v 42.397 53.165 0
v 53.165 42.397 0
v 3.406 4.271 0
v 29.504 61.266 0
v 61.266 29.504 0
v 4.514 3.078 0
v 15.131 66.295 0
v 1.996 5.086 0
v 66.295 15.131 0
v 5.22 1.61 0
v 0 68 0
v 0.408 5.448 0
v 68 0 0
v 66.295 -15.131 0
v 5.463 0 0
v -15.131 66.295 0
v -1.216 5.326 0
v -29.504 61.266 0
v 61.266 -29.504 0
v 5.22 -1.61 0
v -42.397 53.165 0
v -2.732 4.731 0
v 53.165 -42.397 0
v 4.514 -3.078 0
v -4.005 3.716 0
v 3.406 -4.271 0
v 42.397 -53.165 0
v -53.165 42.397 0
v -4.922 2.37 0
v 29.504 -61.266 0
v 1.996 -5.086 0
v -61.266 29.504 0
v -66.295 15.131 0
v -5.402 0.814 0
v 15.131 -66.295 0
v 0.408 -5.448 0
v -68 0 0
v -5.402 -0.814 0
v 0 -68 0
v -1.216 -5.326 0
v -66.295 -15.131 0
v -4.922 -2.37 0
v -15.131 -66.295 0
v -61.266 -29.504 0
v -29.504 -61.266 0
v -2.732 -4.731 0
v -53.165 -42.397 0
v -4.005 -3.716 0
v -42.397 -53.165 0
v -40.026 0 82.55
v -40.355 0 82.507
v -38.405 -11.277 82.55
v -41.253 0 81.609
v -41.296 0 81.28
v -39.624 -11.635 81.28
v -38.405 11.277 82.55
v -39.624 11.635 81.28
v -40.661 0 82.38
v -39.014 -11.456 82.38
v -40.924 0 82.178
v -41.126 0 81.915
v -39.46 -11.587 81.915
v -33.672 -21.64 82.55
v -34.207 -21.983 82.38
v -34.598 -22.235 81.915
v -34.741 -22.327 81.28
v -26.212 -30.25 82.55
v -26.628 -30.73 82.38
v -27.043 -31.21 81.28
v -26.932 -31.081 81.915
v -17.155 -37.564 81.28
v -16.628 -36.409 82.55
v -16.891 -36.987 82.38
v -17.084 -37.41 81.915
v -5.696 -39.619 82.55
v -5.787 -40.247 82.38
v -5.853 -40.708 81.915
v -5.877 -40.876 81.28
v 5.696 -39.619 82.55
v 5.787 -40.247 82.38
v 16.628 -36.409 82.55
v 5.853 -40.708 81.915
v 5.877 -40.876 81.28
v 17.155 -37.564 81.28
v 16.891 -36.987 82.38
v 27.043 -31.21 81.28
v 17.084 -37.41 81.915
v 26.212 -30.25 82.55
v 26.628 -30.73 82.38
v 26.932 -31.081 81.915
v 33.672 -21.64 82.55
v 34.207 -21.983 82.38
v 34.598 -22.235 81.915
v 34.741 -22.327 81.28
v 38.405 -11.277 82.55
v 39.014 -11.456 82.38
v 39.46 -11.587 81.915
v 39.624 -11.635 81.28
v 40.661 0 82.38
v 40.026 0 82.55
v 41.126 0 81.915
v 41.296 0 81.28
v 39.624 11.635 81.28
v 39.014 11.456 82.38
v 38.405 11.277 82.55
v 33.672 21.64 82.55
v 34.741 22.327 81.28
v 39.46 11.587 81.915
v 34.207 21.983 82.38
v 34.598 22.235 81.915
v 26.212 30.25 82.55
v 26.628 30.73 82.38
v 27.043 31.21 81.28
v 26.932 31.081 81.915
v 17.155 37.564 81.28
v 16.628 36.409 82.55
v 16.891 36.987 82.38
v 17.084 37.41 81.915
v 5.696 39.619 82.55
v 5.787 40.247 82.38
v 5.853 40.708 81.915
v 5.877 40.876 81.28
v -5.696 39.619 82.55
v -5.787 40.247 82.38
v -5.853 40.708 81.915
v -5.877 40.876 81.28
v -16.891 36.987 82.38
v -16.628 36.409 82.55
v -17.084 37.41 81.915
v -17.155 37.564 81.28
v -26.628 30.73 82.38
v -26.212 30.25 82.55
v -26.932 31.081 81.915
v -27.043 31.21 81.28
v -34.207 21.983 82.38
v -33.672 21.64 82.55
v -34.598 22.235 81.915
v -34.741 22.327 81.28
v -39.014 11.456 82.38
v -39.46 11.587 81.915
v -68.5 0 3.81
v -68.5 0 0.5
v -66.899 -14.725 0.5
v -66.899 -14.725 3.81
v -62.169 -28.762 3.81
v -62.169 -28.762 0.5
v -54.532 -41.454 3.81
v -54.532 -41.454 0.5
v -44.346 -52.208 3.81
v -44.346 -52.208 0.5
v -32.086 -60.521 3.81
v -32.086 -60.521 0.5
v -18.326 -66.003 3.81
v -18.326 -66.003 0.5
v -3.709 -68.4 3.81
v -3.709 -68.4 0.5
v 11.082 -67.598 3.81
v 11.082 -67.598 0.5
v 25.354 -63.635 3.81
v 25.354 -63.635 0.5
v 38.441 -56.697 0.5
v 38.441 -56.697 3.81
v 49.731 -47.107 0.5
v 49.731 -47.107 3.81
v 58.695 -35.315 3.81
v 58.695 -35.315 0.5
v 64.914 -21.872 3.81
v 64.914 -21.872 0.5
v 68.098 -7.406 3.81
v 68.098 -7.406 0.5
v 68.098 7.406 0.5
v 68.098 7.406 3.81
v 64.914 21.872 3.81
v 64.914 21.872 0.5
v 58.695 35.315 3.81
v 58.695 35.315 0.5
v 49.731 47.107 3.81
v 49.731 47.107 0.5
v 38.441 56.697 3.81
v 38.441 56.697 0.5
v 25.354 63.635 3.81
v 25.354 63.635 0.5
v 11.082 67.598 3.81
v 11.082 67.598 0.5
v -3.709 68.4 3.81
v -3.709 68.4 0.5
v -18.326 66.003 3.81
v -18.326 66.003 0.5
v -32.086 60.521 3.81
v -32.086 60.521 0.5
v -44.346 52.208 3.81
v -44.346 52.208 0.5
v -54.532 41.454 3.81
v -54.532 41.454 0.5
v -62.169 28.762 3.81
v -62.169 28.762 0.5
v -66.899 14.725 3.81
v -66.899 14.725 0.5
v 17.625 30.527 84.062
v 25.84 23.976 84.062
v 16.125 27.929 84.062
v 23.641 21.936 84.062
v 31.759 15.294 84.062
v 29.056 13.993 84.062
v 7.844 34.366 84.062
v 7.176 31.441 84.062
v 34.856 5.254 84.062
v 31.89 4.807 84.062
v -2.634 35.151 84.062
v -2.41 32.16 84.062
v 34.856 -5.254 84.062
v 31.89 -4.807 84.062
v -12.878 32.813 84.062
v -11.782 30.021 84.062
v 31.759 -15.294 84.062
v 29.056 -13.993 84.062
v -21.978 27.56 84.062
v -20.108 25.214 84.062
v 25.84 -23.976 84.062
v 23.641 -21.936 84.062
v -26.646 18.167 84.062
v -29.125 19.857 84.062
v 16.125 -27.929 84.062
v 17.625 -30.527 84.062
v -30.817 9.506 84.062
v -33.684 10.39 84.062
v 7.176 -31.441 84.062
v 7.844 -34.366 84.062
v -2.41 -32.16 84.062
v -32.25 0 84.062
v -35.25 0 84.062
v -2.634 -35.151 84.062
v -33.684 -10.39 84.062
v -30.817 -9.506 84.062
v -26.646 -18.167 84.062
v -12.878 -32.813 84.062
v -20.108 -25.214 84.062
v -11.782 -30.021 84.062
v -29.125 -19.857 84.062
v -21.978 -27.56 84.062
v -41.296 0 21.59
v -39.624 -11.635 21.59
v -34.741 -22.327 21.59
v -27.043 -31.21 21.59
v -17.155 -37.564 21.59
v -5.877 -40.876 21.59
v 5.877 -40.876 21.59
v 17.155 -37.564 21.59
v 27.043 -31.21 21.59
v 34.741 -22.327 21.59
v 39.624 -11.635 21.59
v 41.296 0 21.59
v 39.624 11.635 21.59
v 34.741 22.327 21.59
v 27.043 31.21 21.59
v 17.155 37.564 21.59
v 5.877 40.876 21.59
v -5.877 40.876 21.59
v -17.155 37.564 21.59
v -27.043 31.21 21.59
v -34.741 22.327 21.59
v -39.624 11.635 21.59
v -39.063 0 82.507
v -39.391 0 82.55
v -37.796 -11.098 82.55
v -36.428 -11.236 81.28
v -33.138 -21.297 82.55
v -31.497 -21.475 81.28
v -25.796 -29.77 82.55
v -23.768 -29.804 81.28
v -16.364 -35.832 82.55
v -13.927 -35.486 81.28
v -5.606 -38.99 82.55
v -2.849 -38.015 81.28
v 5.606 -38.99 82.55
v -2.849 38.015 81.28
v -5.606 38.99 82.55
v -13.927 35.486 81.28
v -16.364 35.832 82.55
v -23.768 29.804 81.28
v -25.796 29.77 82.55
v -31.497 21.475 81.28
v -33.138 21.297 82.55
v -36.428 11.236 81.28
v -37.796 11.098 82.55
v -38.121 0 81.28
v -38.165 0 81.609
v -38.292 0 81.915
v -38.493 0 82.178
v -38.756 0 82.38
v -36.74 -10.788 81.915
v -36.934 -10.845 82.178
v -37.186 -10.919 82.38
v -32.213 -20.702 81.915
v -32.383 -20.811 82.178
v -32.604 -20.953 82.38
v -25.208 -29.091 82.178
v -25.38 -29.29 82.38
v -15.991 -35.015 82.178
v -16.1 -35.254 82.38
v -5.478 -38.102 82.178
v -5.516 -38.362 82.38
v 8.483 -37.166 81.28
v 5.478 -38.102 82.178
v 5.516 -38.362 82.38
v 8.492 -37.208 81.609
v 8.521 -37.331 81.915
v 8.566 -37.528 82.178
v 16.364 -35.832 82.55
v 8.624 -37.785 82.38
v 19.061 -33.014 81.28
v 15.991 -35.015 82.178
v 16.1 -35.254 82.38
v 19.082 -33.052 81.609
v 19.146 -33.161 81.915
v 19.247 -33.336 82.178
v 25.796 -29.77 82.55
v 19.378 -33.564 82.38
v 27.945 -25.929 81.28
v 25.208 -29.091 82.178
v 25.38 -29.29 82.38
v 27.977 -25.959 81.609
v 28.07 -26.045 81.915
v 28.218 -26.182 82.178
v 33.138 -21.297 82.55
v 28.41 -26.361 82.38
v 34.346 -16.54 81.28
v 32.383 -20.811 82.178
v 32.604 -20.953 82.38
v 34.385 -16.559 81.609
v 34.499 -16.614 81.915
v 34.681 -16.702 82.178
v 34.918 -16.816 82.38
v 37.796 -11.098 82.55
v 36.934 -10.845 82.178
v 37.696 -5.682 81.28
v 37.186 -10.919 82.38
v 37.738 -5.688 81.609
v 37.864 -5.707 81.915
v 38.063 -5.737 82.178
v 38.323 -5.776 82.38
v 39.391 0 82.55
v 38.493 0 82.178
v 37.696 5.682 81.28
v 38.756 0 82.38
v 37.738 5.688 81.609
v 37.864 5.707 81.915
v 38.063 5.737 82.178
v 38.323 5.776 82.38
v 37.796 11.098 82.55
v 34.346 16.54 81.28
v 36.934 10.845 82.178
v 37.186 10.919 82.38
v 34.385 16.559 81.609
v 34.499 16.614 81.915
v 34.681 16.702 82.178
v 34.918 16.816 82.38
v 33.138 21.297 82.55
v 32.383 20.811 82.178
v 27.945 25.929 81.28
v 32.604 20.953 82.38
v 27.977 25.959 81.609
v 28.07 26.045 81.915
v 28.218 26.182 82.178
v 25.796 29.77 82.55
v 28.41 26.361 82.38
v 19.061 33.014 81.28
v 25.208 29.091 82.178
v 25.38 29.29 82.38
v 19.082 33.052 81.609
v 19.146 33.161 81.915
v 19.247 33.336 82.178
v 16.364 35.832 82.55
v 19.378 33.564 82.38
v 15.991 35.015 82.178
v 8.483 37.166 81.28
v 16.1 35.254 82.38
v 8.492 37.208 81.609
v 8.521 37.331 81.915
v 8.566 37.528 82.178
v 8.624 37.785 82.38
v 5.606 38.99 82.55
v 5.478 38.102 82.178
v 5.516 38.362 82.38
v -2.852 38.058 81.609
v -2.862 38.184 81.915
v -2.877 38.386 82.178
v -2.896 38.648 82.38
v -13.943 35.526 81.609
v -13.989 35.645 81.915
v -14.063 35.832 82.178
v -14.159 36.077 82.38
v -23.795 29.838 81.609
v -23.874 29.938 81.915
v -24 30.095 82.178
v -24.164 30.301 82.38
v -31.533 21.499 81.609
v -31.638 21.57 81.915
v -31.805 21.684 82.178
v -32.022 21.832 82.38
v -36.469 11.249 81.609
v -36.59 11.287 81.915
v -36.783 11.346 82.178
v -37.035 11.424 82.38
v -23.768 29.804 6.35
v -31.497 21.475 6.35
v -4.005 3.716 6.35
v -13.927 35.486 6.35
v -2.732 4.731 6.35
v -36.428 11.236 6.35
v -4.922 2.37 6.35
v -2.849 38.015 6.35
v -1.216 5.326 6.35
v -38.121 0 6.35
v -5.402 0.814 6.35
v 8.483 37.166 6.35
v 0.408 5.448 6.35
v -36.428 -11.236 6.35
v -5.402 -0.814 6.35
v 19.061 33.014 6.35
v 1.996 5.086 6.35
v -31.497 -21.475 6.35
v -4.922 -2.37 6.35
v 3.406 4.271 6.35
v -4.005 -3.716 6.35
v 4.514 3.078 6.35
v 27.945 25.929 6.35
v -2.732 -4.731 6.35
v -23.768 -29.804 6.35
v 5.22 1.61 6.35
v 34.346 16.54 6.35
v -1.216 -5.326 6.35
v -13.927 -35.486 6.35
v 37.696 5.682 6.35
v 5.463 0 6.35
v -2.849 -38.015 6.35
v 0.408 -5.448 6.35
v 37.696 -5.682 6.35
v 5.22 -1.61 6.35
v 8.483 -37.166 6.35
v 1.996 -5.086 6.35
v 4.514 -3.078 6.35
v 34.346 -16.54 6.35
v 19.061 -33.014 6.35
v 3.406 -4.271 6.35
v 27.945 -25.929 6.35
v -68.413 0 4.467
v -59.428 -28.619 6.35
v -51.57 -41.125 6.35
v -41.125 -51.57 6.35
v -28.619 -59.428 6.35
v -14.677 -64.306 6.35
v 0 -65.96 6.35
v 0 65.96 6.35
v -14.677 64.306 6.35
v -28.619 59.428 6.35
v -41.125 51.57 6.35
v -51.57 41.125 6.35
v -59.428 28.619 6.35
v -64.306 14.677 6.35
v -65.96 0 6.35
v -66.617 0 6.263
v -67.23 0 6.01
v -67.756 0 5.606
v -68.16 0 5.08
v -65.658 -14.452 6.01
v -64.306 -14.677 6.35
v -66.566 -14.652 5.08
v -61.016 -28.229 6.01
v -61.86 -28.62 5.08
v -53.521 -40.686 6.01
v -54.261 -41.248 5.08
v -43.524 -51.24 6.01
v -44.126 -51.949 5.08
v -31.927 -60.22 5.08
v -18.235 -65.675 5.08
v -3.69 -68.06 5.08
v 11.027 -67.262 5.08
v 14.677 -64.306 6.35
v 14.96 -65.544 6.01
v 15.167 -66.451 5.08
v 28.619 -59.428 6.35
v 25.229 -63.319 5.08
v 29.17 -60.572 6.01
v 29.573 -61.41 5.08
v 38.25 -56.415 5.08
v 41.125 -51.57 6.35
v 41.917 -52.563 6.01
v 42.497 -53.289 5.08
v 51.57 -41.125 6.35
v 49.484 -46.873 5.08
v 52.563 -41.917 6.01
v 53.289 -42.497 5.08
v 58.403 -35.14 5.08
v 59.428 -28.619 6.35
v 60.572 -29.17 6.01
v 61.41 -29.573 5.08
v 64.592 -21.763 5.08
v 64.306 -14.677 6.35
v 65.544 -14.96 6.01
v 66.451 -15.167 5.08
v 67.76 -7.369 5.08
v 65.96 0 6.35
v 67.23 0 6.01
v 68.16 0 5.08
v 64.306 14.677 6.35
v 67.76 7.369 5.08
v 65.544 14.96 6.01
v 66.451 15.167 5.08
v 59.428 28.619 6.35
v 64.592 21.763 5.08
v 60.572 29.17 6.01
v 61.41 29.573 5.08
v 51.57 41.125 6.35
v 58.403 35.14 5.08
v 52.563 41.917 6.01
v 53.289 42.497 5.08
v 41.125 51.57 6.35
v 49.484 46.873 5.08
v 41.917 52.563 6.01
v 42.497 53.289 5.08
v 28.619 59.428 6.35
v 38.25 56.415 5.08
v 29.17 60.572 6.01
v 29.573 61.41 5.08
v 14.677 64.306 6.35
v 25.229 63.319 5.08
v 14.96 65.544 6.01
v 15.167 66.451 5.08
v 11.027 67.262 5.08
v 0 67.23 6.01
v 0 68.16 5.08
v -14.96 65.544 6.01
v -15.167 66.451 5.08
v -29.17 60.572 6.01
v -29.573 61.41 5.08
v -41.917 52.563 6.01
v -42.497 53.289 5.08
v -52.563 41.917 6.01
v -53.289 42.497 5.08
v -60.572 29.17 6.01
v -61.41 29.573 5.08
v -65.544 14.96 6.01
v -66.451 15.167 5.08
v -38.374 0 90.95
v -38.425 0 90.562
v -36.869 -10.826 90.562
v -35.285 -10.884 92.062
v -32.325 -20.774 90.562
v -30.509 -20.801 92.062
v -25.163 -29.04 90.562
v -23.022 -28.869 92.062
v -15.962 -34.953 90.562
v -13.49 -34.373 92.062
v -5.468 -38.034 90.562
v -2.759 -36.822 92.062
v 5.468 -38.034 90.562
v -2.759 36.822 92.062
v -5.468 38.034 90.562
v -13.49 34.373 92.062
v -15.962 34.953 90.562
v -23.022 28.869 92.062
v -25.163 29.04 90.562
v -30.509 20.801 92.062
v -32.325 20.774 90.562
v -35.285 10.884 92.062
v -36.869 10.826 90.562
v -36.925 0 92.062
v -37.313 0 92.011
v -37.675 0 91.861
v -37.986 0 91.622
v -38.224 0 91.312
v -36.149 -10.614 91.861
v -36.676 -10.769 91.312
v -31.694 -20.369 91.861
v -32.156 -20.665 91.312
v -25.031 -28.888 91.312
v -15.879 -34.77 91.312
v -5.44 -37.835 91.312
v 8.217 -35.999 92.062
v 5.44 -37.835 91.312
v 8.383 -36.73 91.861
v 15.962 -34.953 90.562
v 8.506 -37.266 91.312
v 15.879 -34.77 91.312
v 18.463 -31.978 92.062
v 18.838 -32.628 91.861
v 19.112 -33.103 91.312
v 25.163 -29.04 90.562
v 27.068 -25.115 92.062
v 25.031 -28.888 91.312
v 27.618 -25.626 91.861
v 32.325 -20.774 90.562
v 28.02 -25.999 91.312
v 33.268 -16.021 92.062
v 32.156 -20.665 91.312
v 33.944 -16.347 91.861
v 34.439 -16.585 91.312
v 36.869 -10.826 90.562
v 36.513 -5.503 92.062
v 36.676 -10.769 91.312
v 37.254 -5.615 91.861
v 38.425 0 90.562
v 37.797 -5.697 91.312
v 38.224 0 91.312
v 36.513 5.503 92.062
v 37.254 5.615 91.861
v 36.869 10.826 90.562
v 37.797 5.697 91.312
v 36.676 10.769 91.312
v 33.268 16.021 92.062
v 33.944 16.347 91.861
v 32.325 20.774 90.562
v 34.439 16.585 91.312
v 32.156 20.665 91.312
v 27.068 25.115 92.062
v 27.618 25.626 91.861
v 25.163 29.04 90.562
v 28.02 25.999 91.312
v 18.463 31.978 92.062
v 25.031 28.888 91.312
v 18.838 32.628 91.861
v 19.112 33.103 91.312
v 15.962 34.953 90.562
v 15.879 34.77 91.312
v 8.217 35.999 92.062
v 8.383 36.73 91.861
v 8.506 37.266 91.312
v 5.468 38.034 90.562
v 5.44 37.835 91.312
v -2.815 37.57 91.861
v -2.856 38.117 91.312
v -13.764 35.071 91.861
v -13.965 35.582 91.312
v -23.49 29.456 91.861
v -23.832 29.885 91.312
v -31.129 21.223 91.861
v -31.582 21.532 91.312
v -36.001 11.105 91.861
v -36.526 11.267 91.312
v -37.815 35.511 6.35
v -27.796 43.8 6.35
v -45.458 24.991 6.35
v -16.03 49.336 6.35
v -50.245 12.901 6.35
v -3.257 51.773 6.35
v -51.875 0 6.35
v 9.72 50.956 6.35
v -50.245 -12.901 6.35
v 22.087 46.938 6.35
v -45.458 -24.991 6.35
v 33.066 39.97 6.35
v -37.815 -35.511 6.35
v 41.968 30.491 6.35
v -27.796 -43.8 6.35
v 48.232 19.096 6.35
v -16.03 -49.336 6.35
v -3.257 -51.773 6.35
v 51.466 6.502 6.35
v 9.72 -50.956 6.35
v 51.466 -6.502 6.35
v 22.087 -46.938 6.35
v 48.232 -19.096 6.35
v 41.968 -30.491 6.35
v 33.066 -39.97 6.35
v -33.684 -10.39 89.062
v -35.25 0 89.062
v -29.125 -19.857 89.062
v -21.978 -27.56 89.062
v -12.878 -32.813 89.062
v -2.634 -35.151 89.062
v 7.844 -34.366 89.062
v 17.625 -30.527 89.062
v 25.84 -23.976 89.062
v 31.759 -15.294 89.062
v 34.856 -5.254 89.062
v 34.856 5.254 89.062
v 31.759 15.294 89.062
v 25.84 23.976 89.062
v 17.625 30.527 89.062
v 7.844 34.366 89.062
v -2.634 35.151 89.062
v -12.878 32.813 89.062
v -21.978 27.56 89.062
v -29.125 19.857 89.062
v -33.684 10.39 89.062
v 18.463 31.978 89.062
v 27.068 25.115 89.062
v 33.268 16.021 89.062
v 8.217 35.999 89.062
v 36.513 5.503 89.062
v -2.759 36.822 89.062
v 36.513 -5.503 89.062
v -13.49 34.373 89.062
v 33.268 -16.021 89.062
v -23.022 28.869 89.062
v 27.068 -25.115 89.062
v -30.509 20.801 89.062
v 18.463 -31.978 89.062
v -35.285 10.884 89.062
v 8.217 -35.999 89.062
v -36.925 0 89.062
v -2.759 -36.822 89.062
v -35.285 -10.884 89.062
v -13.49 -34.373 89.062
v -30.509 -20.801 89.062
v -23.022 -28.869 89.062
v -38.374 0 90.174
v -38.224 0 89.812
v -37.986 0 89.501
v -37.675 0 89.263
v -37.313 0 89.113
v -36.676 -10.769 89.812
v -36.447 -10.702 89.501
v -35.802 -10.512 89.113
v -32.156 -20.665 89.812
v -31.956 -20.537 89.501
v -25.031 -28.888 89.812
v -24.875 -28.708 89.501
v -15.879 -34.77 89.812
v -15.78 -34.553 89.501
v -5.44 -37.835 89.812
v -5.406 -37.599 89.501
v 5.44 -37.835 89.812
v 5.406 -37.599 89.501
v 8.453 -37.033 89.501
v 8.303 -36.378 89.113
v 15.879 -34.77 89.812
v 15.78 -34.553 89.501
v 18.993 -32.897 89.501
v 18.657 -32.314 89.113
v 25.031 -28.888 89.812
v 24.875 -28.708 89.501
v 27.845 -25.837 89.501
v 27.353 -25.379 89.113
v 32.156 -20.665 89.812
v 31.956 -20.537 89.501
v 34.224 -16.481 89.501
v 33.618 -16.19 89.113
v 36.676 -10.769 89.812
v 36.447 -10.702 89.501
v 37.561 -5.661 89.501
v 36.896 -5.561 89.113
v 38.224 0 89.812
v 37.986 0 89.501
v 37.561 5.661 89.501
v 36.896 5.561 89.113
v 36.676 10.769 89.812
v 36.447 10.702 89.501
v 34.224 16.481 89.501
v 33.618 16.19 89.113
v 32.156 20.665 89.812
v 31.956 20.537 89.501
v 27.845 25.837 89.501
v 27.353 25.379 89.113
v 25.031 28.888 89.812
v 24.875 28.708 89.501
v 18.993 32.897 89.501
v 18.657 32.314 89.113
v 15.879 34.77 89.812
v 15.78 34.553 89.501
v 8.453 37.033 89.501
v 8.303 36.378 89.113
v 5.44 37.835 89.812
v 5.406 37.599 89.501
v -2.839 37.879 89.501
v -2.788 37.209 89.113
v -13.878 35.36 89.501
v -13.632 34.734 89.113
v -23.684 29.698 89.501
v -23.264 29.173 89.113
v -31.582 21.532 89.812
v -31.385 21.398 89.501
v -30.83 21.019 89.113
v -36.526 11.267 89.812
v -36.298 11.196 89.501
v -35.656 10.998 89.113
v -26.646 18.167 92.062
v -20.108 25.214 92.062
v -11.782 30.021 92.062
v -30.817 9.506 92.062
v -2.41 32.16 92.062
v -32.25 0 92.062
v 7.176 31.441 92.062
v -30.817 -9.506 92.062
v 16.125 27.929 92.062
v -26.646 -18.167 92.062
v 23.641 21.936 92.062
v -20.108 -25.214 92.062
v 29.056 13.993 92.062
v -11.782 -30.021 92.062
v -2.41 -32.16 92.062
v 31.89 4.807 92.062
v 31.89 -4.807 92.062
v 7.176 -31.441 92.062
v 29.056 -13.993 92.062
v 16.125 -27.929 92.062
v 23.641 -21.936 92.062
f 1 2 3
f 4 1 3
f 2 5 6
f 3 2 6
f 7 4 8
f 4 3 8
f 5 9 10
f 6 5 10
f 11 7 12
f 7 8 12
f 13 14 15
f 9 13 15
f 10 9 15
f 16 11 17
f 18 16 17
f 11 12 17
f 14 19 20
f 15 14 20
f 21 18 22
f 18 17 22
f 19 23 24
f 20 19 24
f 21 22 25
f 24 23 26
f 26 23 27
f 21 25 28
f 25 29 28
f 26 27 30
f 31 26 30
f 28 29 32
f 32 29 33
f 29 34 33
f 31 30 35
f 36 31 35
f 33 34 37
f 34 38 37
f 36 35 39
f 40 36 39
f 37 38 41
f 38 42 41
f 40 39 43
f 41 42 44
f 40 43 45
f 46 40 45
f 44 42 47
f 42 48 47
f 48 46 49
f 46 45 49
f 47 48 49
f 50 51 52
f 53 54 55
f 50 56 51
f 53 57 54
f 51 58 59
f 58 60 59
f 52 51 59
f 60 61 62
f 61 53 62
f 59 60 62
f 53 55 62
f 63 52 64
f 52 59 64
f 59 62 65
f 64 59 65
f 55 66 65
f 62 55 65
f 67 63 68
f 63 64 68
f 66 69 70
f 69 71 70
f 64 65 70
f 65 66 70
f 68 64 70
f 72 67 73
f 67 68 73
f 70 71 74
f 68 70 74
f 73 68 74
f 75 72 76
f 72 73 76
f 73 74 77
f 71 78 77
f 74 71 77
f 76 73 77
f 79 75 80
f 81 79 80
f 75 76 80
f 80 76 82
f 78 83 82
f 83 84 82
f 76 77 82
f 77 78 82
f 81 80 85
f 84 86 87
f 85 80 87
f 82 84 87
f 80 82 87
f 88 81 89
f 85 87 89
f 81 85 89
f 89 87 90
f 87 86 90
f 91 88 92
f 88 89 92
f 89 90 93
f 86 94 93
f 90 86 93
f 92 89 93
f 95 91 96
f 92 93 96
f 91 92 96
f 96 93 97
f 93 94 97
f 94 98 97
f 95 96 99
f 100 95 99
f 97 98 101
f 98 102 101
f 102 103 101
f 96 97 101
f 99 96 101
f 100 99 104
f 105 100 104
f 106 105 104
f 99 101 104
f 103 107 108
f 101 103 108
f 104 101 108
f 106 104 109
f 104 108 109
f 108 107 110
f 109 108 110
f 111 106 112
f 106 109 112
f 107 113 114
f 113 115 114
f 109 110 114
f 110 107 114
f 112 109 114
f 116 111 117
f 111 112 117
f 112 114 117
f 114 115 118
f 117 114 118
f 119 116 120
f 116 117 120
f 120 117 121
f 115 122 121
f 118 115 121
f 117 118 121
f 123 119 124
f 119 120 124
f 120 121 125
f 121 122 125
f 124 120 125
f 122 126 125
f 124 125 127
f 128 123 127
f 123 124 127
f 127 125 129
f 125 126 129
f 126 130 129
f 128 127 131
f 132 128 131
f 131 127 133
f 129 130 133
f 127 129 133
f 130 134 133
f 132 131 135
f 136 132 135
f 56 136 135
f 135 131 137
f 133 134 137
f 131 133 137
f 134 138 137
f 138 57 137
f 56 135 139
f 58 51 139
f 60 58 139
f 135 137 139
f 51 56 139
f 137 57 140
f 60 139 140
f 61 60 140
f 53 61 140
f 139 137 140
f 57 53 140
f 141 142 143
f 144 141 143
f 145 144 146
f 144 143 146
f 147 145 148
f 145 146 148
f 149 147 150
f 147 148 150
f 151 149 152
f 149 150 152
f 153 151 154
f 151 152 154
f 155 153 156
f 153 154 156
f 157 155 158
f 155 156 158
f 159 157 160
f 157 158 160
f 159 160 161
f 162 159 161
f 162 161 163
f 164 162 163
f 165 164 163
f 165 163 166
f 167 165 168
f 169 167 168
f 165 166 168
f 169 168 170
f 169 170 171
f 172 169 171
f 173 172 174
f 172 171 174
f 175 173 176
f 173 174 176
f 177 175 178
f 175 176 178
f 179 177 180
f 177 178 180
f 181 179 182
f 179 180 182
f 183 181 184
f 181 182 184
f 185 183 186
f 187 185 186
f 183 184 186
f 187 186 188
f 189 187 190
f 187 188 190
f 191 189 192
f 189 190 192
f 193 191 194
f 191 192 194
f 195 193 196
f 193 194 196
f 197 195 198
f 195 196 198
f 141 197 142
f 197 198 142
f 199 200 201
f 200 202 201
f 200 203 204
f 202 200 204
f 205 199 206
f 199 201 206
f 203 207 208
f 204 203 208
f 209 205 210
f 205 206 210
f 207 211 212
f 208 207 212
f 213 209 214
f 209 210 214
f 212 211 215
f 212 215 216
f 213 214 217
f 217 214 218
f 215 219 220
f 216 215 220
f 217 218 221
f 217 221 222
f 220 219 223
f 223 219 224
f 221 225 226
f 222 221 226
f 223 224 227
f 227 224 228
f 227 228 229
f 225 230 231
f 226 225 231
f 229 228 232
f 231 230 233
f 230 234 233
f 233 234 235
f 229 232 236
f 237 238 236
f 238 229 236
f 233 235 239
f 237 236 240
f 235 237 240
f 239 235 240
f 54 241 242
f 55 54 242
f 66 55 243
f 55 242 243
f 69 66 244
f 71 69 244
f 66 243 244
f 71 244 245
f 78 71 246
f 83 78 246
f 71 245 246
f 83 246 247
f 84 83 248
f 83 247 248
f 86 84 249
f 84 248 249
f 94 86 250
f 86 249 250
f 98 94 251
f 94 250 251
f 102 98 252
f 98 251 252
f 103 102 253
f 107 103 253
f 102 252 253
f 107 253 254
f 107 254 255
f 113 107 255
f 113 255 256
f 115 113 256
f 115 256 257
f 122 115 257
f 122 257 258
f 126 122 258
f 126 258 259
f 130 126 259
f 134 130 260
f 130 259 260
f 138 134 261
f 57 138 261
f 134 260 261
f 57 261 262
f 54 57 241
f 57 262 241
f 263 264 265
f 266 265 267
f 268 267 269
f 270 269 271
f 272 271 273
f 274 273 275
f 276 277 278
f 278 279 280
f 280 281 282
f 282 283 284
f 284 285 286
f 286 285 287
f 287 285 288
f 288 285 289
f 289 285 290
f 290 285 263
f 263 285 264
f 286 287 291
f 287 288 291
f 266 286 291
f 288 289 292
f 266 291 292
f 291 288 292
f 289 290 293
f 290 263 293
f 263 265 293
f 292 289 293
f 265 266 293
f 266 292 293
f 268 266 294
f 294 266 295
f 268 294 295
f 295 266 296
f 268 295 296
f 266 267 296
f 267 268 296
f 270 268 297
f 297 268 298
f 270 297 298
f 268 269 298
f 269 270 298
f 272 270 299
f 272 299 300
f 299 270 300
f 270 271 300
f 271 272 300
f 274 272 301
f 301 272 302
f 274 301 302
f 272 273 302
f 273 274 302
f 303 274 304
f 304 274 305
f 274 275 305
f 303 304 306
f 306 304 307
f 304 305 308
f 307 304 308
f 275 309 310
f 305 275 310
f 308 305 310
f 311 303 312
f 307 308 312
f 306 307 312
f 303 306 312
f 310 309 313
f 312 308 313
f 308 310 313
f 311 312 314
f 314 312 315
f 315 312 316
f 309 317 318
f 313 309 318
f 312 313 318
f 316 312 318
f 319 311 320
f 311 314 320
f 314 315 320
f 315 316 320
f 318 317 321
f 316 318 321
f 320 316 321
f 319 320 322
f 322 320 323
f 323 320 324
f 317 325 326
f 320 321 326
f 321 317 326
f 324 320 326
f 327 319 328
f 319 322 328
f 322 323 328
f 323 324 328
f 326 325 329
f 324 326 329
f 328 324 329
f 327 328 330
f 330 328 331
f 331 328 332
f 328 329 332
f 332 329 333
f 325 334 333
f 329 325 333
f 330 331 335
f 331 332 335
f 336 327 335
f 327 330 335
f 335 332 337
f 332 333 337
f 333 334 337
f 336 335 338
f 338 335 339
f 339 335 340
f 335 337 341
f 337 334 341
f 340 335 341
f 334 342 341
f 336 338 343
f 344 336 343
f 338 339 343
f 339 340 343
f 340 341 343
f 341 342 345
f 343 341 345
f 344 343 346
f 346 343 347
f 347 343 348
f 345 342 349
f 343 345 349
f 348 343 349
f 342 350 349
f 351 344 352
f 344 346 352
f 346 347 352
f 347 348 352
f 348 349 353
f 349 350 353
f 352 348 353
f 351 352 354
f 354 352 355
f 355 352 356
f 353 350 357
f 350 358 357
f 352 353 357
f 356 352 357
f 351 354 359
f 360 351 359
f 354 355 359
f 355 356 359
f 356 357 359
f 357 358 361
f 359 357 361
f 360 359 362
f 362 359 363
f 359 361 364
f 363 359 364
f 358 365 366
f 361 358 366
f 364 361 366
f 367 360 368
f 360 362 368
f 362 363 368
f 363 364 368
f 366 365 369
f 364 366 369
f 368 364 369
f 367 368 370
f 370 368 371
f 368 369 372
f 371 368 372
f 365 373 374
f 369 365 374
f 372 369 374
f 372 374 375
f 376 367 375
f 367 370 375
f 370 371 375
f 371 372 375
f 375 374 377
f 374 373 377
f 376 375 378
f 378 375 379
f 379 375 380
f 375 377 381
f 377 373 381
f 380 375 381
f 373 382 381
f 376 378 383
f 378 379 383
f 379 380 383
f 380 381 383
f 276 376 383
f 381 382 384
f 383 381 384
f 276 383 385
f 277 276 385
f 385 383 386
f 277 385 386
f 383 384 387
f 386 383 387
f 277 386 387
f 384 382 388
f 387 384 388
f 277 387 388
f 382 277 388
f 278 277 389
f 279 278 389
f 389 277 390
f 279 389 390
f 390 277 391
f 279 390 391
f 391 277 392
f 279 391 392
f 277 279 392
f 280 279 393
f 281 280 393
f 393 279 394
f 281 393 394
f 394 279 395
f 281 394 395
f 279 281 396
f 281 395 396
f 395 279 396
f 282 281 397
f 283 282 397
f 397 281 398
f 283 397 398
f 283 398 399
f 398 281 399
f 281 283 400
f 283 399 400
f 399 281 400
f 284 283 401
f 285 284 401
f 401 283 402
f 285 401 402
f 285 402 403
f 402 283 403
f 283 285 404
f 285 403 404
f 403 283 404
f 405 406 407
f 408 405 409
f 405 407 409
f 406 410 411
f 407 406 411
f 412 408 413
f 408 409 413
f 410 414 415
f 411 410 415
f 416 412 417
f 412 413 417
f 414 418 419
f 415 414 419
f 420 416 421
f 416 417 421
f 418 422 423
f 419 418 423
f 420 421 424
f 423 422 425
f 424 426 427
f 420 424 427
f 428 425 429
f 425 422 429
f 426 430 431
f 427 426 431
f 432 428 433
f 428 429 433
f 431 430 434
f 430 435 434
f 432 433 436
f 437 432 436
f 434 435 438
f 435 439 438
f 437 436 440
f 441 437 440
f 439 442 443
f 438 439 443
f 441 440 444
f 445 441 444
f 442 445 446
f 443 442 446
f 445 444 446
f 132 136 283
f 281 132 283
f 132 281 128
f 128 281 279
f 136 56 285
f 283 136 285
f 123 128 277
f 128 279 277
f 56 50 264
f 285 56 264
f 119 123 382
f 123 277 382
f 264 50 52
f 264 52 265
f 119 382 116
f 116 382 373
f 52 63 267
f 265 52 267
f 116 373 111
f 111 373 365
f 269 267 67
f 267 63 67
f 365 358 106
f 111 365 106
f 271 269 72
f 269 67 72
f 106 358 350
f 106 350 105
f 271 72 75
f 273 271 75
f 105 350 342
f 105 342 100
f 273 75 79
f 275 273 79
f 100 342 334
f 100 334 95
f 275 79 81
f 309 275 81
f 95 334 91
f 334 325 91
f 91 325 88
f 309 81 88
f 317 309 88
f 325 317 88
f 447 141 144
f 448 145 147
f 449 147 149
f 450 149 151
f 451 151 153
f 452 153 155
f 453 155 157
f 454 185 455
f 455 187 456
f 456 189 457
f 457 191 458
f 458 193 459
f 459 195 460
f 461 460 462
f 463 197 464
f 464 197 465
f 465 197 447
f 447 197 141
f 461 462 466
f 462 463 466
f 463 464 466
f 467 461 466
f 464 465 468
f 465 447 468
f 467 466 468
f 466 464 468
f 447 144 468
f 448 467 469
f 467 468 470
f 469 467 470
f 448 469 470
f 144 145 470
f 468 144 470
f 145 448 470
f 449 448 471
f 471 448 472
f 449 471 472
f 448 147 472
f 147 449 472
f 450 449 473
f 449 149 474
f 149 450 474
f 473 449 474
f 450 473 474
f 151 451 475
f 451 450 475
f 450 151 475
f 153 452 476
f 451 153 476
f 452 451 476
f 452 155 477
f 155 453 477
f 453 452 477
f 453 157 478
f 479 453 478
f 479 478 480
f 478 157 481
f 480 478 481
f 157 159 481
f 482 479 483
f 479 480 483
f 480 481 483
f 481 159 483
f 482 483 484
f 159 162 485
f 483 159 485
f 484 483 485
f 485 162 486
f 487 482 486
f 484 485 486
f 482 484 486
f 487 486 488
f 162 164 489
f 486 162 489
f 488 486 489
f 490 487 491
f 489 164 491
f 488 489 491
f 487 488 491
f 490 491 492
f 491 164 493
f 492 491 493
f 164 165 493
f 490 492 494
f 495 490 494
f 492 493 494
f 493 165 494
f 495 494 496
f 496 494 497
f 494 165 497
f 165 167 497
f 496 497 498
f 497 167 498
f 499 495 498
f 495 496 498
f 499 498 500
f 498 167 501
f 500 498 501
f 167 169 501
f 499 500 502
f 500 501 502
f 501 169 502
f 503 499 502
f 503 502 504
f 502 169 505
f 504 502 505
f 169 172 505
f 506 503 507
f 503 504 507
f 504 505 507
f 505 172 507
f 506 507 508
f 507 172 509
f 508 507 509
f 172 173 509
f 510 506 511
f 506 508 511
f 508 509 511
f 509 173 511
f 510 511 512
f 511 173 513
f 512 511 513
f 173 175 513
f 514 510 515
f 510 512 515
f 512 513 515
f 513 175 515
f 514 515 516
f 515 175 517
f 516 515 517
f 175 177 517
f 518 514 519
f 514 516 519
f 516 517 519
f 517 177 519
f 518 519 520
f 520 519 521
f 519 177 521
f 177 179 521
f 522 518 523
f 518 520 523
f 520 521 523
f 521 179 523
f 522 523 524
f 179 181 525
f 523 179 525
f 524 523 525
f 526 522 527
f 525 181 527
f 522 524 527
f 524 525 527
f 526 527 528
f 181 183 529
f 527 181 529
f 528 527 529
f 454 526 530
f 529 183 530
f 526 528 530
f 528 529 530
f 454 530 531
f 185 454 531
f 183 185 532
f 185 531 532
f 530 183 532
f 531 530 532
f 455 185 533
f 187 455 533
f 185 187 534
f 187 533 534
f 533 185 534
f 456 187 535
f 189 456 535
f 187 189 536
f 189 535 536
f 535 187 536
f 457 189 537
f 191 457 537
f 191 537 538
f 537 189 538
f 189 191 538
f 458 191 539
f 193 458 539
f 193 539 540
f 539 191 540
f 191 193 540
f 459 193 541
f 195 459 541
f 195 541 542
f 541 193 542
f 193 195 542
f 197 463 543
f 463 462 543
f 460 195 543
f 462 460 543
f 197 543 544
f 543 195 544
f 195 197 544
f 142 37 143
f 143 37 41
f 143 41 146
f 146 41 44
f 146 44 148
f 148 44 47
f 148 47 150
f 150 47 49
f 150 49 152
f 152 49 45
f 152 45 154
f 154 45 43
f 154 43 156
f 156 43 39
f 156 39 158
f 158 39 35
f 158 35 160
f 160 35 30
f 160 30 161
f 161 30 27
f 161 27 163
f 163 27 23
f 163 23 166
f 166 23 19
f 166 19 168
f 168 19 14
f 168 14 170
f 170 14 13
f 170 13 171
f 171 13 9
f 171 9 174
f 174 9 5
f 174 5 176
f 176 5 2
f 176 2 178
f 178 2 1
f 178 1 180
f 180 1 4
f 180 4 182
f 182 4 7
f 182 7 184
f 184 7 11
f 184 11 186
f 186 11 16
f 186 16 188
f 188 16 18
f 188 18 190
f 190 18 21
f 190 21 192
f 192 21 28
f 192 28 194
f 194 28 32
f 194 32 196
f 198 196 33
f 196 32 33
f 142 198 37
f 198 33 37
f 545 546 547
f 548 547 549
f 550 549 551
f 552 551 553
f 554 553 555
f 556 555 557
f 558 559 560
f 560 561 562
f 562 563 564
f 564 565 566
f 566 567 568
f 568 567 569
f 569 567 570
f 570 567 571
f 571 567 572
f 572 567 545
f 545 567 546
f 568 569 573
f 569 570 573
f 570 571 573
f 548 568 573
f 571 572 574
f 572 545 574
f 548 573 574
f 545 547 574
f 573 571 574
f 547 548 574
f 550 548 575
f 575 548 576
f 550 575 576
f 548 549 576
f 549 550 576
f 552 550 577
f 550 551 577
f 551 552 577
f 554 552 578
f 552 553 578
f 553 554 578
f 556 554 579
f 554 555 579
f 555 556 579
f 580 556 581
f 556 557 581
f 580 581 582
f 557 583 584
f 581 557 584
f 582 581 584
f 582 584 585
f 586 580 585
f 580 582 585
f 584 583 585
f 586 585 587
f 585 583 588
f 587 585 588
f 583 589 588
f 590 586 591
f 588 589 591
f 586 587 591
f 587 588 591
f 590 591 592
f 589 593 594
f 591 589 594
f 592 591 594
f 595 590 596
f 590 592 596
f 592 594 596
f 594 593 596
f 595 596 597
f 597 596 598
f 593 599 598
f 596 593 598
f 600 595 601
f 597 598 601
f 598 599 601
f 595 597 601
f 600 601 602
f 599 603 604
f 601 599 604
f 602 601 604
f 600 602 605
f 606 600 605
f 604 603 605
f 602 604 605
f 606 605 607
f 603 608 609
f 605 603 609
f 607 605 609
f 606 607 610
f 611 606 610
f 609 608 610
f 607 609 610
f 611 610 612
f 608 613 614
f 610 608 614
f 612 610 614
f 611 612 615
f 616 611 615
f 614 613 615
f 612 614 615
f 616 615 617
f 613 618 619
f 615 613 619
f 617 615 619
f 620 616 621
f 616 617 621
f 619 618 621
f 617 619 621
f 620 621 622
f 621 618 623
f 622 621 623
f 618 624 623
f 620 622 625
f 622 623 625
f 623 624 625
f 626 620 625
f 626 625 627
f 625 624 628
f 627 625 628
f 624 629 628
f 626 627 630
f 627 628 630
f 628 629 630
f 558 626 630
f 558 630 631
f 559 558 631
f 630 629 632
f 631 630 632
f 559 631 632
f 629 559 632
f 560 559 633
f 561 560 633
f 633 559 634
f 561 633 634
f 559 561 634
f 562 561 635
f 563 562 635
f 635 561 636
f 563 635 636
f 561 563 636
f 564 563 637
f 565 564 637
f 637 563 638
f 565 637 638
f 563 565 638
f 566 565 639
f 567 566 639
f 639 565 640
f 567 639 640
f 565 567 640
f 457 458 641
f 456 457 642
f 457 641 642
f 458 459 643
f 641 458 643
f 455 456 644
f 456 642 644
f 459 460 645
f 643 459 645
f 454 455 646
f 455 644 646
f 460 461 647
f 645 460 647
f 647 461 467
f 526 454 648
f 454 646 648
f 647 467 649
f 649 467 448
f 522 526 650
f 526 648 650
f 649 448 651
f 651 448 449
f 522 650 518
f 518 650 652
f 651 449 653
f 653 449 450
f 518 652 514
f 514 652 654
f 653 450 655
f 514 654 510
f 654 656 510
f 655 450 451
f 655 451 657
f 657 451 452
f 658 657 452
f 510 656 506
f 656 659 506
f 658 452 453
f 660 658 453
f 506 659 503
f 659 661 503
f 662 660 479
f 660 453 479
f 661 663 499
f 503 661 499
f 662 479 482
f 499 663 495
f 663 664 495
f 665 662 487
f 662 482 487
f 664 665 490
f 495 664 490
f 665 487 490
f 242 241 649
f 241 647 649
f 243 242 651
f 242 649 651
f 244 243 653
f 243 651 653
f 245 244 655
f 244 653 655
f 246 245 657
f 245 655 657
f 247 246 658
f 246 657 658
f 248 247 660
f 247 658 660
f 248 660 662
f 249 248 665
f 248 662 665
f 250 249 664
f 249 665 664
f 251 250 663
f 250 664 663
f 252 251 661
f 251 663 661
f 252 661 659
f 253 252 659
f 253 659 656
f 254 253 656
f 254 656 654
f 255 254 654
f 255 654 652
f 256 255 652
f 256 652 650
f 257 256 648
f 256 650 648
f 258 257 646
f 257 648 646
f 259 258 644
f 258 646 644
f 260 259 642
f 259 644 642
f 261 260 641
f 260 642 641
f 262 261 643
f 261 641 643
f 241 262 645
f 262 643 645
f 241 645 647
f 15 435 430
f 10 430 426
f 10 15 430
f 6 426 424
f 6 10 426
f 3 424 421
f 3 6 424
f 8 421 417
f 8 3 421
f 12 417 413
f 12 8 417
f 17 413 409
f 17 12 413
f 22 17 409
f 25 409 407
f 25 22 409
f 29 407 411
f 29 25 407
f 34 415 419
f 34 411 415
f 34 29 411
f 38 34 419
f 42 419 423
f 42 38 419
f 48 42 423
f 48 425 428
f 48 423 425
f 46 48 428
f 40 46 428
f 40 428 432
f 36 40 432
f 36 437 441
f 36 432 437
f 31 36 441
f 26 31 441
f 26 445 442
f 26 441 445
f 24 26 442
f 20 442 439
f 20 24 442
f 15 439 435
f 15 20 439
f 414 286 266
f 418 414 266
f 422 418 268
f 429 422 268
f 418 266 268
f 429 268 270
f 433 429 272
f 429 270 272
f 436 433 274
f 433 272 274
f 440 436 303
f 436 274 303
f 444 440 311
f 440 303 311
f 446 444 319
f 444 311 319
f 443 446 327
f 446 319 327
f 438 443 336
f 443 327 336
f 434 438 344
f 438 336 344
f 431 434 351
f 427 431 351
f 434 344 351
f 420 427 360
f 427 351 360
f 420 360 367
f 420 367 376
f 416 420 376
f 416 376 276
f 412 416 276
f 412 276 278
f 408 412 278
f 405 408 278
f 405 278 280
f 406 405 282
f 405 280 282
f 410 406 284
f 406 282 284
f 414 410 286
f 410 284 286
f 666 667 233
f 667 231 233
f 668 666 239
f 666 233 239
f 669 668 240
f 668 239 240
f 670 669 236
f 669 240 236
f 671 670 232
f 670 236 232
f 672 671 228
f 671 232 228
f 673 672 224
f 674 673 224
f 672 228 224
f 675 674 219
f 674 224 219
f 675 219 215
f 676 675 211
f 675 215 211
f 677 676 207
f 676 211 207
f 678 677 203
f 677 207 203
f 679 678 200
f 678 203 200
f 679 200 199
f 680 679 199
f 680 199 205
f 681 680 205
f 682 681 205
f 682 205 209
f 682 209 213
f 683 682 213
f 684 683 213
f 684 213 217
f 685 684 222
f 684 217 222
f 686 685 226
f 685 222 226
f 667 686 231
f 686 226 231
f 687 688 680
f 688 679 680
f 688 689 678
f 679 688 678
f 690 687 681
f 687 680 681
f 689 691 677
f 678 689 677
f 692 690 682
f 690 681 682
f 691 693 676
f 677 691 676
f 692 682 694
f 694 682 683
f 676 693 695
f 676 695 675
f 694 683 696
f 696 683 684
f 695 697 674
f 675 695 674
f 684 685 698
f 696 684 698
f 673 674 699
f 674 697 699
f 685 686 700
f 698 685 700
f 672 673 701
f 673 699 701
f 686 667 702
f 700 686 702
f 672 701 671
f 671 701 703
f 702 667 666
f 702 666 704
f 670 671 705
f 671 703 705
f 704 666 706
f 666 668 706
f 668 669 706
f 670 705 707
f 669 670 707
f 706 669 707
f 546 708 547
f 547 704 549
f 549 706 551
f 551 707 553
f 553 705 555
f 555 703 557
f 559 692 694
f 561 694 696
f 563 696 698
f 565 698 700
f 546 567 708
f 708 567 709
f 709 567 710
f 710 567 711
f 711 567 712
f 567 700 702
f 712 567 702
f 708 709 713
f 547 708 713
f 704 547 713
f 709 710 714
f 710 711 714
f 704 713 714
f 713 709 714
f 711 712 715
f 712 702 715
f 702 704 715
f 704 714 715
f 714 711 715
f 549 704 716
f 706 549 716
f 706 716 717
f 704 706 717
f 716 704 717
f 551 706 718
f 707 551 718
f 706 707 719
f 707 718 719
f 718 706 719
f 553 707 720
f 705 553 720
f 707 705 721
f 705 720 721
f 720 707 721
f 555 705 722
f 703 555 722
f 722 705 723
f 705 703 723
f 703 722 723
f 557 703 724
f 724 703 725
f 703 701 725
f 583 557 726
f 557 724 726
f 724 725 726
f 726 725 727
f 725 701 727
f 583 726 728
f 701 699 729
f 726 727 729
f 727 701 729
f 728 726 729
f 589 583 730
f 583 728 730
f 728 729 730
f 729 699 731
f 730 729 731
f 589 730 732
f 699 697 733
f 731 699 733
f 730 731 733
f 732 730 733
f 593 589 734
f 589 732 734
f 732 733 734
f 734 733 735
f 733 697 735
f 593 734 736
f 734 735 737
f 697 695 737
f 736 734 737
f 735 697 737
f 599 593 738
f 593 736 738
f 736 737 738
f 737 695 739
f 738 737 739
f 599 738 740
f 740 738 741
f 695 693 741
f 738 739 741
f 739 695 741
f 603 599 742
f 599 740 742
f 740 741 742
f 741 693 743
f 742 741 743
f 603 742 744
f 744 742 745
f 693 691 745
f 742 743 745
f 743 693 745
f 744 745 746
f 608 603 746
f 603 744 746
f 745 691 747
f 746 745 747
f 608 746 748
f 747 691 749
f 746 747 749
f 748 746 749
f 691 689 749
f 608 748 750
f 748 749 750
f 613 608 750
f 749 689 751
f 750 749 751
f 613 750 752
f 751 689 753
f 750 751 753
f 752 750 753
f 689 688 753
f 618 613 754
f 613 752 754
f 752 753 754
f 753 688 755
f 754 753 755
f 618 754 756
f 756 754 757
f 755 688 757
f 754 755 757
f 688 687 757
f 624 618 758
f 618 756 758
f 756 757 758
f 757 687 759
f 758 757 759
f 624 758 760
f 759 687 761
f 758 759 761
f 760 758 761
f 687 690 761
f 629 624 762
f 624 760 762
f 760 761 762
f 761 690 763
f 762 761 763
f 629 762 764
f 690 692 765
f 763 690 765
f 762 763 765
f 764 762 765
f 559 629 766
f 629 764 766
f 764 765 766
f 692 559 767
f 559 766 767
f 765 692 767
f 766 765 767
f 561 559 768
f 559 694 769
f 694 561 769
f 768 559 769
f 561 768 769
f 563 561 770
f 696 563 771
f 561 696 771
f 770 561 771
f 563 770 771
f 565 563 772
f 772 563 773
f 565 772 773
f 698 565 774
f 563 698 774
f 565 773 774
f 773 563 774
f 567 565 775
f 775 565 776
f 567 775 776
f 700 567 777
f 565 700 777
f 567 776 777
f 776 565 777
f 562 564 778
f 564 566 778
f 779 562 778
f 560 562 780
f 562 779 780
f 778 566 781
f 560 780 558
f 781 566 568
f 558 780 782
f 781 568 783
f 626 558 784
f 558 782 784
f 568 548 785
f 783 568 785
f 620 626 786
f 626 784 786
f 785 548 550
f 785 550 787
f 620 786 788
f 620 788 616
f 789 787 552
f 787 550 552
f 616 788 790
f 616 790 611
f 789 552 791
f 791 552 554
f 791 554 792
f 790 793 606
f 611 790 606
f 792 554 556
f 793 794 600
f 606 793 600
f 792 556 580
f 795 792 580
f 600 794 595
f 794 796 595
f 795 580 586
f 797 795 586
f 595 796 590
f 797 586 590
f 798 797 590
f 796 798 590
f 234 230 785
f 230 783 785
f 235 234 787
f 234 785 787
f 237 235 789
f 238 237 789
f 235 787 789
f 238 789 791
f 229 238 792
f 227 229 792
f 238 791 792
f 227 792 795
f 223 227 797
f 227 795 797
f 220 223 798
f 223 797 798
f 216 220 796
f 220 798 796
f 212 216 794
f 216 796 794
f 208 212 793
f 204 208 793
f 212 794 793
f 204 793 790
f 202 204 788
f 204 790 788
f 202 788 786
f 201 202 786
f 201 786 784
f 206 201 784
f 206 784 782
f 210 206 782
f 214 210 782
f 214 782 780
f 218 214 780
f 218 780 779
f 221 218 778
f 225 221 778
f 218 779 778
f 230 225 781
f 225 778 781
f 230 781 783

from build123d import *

# Parameters (mm, degrees)
F6_R     = 2.54
F7_R     = 5.4631705107
F8_DEPTH = 82.551
F9_SIZE  = 0.5
F10_R    = 1.27
F11_R    = 1.27
F13_R    = 1.5
F14_R    = 1.49999


# Not quite as in the source:
# - a fillet or chamfer is up to 0.001 mm smaller than in the source, because OpenCascade refuses the exact size


with BuildPart() as f5:
    # F2 (on Front) → F5 (revolve)
    with BuildSketch(Plane.XZ):
        Polygon((-51.875, 6.35), (-68.5, 6.35), (-68.5, 0), (0, 0), (0, 6.35), (-38.1213697813, 6.35), (-38.1213697813, 82.55), (-41.2963697813, 82.55), (-41.2963697813, 21.59), align=None)
    revolve(axis=Axis((0, 0, 3.175), (0, 0, 1)))

    # F6
    f6_edges = [f5.edges().sort_by_distance(p)[0] for p in [
        (68.5, 0, 6.35),
    ]]
    fillet(f6_edges, radius=F6_R)

    # F7 (on Top) → F8 (cut, through all)
    with BuildSketch(Plane.XY):
        Circle(F7_R)
    extrude(amount=F8_DEPTH, mode=Mode.SUBTRACT)

    # F9
    f9_edges = [f5.edges().sort_by_distance(p)[0] for p in [
        (68.5, 0, 0),
    ]]
    chamfer(f9_edges, length=F9_SIZE)

    # F10
    f10_edges = [f5.edges().sort_by_distance(p)[0] for p in [
        (38.12137, 0, 82.55),
    ]]
    fillet(f10_edges, radius=F10_R)

    # F11
    f11_edges = [f5.edges().sort_by_distance(p)[0] for p in [
        (41.29637, 0, 82.55),
    ]]
    fillet(f11_edges, radius=F11_R)


with BuildPart() as f12:
    # F4 (on Front) → F12 (revolve)
    with BuildSketch(Plane.XZ):
        Polygon((-35.25, 89.0617567301), (-35.25, 84.0617567301), (-32.25, 84.0617567301), (-32.25, 92.0617567301), (-38.425, 92.0617567301), (-38.425, 89.0617567301), align=None)
    revolve(axis=Axis((0, 0, 41.1046370864), (0, 0, 1)))

    # F13
    f13_edges = [f12.edges().sort_by_distance(p)[0] for p in [
        (38.425, 0, 92.061757),
    ]]
    fillet(f13_edges, radius=F13_R)

    # F14 (radius 1.5 in the source; OpenCascade refuses exactly that, so slightly less here)
    f14_edges = [f12.edges().sort_by_distance(p)[0] for p in [
        (38.425, 0, 89.061757),
        (-38.425, 0, 89.811757),
        (38.425, 0, 90.561757),
    ]]
    fillet(f14_edges, radius=F14_R)


solid = Compound([f5.part, f12.part])
